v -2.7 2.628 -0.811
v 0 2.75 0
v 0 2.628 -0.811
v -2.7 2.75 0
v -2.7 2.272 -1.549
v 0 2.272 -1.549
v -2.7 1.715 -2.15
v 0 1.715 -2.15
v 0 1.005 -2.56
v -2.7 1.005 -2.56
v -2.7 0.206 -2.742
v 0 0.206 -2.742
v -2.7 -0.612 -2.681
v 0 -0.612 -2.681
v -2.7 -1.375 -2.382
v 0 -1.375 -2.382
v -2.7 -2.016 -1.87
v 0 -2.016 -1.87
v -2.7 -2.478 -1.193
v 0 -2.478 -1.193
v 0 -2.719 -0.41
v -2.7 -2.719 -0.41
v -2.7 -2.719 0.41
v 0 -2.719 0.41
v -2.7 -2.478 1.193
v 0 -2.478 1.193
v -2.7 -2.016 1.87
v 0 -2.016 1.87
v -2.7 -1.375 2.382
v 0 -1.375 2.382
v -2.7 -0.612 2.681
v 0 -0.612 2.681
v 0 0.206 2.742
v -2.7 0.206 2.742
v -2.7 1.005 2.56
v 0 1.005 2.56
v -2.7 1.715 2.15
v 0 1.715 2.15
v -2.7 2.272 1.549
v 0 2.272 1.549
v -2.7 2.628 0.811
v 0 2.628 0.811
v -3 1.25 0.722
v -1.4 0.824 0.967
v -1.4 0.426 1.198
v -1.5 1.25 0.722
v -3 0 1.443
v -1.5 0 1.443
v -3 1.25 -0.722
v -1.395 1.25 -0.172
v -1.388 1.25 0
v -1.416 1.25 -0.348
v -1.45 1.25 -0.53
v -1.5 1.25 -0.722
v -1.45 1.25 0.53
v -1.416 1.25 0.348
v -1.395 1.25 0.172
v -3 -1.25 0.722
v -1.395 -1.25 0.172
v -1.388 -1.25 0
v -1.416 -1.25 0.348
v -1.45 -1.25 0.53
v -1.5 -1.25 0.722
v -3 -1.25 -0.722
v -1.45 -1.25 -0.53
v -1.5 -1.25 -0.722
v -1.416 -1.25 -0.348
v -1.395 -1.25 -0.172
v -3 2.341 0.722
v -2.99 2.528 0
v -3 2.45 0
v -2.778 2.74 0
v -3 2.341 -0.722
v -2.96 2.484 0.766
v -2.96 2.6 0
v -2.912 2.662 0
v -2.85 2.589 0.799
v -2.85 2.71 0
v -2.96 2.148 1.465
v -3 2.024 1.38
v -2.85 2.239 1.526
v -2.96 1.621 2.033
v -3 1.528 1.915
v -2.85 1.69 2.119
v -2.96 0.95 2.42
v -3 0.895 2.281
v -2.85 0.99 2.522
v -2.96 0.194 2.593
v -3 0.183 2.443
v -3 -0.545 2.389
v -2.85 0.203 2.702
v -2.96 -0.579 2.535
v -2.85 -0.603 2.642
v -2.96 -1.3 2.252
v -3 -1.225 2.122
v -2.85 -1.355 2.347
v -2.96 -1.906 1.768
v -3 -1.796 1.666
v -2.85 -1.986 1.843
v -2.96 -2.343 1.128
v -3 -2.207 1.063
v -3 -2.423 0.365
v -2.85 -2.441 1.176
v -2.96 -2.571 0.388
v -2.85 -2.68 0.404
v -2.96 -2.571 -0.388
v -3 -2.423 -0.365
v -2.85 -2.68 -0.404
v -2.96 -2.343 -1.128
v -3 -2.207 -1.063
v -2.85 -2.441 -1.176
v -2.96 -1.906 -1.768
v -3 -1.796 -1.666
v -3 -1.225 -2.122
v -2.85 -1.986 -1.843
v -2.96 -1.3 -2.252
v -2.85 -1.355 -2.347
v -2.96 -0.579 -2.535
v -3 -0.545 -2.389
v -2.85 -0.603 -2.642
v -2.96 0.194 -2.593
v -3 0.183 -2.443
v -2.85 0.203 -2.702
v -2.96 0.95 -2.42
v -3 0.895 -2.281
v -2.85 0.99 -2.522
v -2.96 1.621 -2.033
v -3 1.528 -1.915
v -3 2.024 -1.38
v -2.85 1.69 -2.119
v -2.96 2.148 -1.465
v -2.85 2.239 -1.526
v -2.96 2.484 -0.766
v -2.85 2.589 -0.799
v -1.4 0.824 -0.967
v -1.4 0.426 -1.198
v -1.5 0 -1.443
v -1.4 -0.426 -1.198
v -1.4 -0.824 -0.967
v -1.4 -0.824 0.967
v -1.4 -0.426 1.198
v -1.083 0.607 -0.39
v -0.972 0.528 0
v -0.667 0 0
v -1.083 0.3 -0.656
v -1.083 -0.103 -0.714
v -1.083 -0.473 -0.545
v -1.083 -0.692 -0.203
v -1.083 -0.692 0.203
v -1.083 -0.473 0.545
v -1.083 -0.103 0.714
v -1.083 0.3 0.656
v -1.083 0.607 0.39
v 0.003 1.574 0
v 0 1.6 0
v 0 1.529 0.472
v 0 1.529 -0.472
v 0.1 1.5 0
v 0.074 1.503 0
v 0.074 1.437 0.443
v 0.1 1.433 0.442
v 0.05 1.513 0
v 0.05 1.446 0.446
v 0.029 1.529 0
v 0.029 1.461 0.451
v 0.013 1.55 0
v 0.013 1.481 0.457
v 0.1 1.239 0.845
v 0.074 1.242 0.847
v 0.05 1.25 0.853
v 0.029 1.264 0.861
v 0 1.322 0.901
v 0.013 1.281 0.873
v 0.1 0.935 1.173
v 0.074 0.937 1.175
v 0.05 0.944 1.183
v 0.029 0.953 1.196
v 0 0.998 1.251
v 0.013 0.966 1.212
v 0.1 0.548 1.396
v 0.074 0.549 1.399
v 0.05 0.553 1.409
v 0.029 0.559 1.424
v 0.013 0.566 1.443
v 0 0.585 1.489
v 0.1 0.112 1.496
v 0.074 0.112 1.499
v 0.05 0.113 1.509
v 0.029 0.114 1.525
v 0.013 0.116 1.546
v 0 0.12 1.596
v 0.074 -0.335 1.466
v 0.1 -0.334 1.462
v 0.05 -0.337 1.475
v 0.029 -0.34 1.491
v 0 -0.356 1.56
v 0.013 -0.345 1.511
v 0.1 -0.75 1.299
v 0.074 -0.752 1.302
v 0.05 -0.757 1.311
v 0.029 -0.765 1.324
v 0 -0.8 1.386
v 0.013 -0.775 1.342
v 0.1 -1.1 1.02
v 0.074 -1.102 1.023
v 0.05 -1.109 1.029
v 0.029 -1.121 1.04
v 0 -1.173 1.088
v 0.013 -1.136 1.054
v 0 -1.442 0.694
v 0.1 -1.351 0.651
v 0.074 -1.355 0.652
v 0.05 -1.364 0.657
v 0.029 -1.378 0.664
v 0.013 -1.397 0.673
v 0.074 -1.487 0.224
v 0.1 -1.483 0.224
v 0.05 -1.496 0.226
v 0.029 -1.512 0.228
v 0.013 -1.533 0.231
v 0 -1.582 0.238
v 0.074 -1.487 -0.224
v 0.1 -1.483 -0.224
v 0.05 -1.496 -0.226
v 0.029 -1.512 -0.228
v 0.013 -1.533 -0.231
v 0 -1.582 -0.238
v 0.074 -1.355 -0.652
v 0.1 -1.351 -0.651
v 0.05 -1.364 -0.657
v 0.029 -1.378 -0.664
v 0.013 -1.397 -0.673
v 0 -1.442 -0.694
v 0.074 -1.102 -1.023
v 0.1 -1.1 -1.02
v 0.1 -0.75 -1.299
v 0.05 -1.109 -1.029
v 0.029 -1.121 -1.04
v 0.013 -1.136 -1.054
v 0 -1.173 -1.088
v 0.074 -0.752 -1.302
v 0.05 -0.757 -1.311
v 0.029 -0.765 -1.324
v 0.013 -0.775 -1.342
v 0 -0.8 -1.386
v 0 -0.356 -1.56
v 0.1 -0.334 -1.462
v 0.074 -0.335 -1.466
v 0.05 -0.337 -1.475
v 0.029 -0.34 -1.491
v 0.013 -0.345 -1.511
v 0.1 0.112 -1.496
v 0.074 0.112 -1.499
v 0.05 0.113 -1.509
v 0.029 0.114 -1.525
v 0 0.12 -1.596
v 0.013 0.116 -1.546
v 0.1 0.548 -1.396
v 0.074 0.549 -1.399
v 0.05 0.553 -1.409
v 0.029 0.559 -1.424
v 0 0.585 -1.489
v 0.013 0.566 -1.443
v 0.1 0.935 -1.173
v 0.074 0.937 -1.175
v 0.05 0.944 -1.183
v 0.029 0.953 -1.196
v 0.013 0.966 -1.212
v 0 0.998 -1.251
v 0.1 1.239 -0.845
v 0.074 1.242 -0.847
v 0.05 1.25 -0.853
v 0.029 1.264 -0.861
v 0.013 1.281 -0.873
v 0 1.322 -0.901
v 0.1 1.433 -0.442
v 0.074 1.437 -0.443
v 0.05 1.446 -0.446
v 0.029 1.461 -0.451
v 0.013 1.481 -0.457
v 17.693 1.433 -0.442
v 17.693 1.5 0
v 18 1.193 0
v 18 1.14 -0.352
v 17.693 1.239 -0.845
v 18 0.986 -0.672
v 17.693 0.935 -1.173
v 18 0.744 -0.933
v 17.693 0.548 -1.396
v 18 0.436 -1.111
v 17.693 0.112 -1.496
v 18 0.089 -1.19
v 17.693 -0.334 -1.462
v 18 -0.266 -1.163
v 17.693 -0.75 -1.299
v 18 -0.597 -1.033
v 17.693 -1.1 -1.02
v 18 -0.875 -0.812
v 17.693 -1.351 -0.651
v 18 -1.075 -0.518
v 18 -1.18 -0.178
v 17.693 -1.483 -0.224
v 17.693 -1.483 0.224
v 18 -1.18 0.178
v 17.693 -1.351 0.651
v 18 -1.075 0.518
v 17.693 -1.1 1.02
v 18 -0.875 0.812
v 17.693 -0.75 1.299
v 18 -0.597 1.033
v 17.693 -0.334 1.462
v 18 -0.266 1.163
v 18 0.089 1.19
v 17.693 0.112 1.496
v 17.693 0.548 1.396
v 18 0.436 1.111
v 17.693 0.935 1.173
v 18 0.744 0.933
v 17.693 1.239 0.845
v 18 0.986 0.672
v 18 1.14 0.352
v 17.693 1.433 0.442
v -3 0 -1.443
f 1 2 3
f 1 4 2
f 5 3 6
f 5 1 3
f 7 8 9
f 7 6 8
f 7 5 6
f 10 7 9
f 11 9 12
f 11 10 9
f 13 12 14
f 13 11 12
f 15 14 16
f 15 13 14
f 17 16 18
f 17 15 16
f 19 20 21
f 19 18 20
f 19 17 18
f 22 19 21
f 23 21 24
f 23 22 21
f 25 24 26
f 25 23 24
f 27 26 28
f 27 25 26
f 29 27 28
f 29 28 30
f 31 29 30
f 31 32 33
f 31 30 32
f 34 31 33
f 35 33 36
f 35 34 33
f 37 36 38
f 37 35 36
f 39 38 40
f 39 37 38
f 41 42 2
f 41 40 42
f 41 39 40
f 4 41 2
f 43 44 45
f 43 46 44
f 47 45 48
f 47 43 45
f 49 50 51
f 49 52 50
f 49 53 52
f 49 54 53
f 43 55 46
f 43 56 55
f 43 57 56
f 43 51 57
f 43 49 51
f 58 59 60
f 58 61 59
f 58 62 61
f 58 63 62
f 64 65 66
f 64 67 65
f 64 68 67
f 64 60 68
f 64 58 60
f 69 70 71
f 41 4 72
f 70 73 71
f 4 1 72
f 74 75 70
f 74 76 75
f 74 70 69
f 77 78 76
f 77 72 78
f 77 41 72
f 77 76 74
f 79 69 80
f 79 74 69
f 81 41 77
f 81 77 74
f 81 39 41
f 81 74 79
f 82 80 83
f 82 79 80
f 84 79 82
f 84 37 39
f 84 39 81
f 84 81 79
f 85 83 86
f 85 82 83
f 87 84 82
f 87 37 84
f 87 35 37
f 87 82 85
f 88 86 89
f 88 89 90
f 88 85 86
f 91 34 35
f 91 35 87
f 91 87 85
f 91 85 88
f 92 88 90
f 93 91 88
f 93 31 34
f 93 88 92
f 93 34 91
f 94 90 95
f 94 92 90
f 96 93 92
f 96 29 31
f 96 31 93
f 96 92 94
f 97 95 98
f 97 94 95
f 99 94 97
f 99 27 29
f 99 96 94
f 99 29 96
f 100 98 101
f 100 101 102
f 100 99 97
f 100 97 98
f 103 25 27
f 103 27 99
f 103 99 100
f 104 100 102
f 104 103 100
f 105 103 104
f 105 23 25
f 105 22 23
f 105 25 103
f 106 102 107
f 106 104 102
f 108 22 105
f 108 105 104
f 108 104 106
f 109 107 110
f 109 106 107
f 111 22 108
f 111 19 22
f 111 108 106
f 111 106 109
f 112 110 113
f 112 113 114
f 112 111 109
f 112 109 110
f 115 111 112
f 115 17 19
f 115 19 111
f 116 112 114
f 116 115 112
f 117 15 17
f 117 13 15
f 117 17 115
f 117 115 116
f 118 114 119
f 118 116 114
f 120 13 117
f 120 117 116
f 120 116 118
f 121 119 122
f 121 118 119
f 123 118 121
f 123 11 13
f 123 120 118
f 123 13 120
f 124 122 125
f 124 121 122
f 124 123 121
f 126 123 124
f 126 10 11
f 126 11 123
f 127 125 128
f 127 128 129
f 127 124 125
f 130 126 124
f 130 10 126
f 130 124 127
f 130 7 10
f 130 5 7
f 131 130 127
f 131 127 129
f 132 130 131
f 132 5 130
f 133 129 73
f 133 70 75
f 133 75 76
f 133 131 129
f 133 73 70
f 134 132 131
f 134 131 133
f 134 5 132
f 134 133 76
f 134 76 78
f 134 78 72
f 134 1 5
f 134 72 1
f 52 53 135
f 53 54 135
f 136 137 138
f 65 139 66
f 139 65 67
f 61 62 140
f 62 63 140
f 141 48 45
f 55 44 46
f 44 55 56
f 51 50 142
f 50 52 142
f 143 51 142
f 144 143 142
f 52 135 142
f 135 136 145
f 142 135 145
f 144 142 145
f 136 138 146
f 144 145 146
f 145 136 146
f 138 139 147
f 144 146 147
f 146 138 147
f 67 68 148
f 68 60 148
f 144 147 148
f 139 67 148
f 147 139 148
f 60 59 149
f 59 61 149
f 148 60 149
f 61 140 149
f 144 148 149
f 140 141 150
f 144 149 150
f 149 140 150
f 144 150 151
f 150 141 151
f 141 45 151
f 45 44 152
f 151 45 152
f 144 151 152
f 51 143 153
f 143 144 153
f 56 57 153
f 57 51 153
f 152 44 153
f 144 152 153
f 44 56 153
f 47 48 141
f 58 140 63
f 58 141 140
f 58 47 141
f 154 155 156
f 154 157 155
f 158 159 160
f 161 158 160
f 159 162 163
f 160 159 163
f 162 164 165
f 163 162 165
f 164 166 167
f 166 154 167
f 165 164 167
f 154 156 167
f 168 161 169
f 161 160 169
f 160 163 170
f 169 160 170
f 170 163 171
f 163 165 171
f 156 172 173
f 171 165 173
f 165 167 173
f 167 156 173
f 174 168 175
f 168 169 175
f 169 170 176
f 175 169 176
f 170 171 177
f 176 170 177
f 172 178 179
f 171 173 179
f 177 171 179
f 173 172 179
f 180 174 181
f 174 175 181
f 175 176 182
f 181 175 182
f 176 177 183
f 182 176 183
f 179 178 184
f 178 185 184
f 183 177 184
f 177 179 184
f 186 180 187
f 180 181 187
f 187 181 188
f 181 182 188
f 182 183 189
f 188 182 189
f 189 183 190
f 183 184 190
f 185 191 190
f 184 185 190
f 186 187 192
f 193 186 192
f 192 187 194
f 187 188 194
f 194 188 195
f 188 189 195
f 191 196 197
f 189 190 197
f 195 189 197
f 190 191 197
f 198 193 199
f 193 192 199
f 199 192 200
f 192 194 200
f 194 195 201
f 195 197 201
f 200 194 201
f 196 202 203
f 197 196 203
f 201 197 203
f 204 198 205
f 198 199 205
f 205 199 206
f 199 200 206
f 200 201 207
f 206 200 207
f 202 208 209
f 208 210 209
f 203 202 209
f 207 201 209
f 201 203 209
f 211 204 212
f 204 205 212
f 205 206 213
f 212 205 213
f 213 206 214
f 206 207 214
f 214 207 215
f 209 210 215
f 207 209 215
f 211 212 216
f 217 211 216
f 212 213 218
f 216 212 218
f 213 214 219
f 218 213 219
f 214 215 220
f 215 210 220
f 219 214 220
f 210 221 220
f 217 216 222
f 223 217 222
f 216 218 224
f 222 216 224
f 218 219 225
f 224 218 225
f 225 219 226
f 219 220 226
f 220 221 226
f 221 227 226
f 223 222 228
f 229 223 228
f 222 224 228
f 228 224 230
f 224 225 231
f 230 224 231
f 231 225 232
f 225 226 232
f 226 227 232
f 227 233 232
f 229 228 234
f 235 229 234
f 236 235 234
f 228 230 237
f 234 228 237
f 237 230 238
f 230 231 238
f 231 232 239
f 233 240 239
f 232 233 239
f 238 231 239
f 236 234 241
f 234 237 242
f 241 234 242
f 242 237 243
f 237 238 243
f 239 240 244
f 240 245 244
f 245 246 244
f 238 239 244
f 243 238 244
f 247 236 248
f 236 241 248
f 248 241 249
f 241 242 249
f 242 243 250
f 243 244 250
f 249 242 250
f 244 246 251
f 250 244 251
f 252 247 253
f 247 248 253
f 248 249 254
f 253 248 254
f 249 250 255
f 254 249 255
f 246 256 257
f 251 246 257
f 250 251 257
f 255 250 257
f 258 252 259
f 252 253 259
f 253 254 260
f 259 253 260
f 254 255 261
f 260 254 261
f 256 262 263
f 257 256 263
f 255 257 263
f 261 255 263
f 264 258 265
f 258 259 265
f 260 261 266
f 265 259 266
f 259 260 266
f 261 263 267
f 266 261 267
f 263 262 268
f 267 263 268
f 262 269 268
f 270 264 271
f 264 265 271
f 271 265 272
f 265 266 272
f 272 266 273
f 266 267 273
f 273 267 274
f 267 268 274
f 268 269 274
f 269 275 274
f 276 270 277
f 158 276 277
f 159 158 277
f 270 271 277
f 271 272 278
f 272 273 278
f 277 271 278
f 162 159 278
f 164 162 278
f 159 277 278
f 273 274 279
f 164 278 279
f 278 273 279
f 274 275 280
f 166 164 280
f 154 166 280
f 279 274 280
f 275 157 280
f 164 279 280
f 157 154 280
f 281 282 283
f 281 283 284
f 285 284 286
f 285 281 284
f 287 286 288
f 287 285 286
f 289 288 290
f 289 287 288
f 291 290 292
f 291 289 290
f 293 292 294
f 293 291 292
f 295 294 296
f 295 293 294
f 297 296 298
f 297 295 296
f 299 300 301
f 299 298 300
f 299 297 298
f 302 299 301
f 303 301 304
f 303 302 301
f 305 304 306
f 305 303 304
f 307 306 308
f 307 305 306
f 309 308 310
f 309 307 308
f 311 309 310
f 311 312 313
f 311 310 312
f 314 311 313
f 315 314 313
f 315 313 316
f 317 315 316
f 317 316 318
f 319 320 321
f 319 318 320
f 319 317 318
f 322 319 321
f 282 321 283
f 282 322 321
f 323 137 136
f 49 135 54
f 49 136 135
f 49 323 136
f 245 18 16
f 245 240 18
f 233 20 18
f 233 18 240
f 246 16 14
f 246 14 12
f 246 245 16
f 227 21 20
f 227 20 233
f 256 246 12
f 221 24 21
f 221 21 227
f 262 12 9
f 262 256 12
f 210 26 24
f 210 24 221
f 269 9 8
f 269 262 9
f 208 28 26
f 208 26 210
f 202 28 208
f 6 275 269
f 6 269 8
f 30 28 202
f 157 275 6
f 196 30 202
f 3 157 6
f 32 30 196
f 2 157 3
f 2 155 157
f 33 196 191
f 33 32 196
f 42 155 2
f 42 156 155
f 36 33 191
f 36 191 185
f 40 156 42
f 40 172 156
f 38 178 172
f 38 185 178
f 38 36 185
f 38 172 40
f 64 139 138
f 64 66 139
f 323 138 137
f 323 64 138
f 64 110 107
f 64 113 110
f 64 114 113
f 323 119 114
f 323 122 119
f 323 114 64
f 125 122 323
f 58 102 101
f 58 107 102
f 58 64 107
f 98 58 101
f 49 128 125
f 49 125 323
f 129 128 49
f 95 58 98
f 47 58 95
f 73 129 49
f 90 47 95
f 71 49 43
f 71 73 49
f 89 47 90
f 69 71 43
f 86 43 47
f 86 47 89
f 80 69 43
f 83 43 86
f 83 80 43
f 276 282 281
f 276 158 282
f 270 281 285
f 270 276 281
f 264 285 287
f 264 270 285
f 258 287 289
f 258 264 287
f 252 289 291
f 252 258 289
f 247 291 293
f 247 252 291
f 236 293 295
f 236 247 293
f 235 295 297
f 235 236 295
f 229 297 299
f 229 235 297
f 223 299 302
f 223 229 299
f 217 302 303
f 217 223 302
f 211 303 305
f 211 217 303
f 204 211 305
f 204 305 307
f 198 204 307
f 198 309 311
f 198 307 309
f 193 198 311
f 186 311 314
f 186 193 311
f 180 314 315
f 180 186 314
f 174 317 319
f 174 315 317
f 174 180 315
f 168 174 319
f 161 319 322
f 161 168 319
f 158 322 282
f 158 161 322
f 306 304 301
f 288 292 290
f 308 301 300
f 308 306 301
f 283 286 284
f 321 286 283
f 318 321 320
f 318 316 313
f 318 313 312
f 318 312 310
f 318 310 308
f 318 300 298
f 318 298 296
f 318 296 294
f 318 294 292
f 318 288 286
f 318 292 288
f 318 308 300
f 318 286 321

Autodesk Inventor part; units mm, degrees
ref_plane "YZ Plane" through (0, 0, 0) normal (1, 0, 0) x (0, 1, 0)
ref_plane "XZ Plane" through (0, 0, 0) normal (0, 1, 0) x (-1, 0, 0)
sketch "Sketch1" plane through (0, 0, 0) normal (0, 0, 1) x (1, 0, 0)
  line L0 (-0.6667, 0) -> (18, 0)
  line L1 (18, 0) -> (18, 1.5)
  line L2 (18, 1.5) -> (3.3067, 1.5)
  line L3 (3.3067, 1.5) -> (2.9999, 1.5)
  line L4 (2.9999, 1.5) -> (0, 1.5)
  line L5 (0, 1.5) -> (0, 2.75)
  line L6 (0, 2.75) -> (-3, 2.75)
  line L7 (-3, 2.75) -> (-3, 1.4434)
  line L8 (-3, 1.4434) -> (-1.5, 1.4434)
  line L9 (-1.5, 1.4434) -> (-0.6667, 0)
  line L10 (-6.8, 0) -> (19.8, 0) projected
  line L11 (0, -0.55) -> (0, 3.3) projected
  line L12 (3.3067, 1.5) -> (0, 1.5) construction
  dimension "d1" = 14.6933
  dimension "d2" = 0.3068
  dimension "d3" = 3
  dimension "d4" = 1.5
  dimension "d5" = 60
  dimension "d6" = 3
  dimension "d7" = 3
  dimension "d8" = 2.8868
  dimension "d9" = 5.5
  dimension "d26" = 18
revolve "Body" add sketch "Sketch1" angle 360 about axis through (-0.6667, 0, 0) along (1, 0, 0)
sketch "Sketch2" plane through (-3, 0, 0) normal (-1, 0, 0) x (0, 0, 1)
  circle A0 centre (0, 0) radius 1.4434 projected
  line L0 (0, -3.85) -> (0, 3.85) projected
  line L1 (-3.85, 0) -> (3.85, 0) projected
  line L2 (1.4434, 0) -> (0.7217, -1.25)
  line L3 (0.7217, -1.25) -> (-0.7217, -1.25)
  line L4 (-0.7217, -1.25) -> (-1.4434, 0)
  line L5 (-1.4434, 0) -> (-0.7217, 1.25)
  line L6 (-0.7217, 1.25) -> (0.7217, 1.25)
  line L7 (0.7217, 1.25) -> (1.4434, 0)
extrude "Slot" add sketch "Sketch2" against normal up to next contours L7 A0 | A0 L2 | L6 L0 A0 | A0 L0 L3 | L0 L6 A0 | A0 L3 L0 | L4 A0 | A0 L5
fillet "Fillet1" radius 0.3 1 edges at (-3, -2.75, 0)
thread "Thread" size "M3x0.5" class "6g" standard "ISO Metric profile" length 14.6933
chamfer "Chamfer1" distance 0.3067 distance2 0.3067 1 edges at (18, -1.5, 0) measured on face at (18, -0.4645, -0.4115)
ref_plane "Work Plane1" through (29, 0, 0) normal (0, -1, 0) x (1, 0, 0)
fillet "Fillet2" radius 0.1 1 edges at (0, -1.5, 0)
equation "\"d1\" = GEL"
equation "\"d3\" = KOH"
equation "\"d4\" = INTI"
equation "\"d6\" = GD"
equation "\"d7\" = BDM"
equation "\"d8\" = 1.1547 * SW"
equation "\"d9\" = KOD"
equation "\"d26\" = NLG"
equation "\"d30\" = R"
equation "\"d17\" = RR"
equation "\"d13\" = GEL"
equation "\"d15\" = -0.5 * SPD + 0.5 * GD"
equation "\"d16\" = GUL"
equation "\"GD\" = NND"
equation "\"NLG\" = 18"
equation "\"GEL\" = 14.69328"
equation "\"KOD\" = 5.5"
equation "\"KOH\" = 3"
equation "\"INTI\" = 1.5"
equation "\"GAL\" = 0.61345 * PTC"
equation "\"GUL\" = 0.61345 * PTC"
equation "\"BDM\" = NND"
equation "\"SW\" = 2.5"
equation "\"RR\" = 0.3"
equation "\"SPD\" = 2.38655"
equation "\"R\" = 0.1"
equation "\"TOA\" = 30deg"
equation "\"THREADDIA\" = 3"
equation "\"PTC\" = 0.5"
equation "\"NND\" = 3"
equation "\"E0\" = 1.155 * SW"
equation "\"GD1\" = THREADDIA - 1.2269 * PTC"
properties part number "M3x18" material "Steel, Mild"
